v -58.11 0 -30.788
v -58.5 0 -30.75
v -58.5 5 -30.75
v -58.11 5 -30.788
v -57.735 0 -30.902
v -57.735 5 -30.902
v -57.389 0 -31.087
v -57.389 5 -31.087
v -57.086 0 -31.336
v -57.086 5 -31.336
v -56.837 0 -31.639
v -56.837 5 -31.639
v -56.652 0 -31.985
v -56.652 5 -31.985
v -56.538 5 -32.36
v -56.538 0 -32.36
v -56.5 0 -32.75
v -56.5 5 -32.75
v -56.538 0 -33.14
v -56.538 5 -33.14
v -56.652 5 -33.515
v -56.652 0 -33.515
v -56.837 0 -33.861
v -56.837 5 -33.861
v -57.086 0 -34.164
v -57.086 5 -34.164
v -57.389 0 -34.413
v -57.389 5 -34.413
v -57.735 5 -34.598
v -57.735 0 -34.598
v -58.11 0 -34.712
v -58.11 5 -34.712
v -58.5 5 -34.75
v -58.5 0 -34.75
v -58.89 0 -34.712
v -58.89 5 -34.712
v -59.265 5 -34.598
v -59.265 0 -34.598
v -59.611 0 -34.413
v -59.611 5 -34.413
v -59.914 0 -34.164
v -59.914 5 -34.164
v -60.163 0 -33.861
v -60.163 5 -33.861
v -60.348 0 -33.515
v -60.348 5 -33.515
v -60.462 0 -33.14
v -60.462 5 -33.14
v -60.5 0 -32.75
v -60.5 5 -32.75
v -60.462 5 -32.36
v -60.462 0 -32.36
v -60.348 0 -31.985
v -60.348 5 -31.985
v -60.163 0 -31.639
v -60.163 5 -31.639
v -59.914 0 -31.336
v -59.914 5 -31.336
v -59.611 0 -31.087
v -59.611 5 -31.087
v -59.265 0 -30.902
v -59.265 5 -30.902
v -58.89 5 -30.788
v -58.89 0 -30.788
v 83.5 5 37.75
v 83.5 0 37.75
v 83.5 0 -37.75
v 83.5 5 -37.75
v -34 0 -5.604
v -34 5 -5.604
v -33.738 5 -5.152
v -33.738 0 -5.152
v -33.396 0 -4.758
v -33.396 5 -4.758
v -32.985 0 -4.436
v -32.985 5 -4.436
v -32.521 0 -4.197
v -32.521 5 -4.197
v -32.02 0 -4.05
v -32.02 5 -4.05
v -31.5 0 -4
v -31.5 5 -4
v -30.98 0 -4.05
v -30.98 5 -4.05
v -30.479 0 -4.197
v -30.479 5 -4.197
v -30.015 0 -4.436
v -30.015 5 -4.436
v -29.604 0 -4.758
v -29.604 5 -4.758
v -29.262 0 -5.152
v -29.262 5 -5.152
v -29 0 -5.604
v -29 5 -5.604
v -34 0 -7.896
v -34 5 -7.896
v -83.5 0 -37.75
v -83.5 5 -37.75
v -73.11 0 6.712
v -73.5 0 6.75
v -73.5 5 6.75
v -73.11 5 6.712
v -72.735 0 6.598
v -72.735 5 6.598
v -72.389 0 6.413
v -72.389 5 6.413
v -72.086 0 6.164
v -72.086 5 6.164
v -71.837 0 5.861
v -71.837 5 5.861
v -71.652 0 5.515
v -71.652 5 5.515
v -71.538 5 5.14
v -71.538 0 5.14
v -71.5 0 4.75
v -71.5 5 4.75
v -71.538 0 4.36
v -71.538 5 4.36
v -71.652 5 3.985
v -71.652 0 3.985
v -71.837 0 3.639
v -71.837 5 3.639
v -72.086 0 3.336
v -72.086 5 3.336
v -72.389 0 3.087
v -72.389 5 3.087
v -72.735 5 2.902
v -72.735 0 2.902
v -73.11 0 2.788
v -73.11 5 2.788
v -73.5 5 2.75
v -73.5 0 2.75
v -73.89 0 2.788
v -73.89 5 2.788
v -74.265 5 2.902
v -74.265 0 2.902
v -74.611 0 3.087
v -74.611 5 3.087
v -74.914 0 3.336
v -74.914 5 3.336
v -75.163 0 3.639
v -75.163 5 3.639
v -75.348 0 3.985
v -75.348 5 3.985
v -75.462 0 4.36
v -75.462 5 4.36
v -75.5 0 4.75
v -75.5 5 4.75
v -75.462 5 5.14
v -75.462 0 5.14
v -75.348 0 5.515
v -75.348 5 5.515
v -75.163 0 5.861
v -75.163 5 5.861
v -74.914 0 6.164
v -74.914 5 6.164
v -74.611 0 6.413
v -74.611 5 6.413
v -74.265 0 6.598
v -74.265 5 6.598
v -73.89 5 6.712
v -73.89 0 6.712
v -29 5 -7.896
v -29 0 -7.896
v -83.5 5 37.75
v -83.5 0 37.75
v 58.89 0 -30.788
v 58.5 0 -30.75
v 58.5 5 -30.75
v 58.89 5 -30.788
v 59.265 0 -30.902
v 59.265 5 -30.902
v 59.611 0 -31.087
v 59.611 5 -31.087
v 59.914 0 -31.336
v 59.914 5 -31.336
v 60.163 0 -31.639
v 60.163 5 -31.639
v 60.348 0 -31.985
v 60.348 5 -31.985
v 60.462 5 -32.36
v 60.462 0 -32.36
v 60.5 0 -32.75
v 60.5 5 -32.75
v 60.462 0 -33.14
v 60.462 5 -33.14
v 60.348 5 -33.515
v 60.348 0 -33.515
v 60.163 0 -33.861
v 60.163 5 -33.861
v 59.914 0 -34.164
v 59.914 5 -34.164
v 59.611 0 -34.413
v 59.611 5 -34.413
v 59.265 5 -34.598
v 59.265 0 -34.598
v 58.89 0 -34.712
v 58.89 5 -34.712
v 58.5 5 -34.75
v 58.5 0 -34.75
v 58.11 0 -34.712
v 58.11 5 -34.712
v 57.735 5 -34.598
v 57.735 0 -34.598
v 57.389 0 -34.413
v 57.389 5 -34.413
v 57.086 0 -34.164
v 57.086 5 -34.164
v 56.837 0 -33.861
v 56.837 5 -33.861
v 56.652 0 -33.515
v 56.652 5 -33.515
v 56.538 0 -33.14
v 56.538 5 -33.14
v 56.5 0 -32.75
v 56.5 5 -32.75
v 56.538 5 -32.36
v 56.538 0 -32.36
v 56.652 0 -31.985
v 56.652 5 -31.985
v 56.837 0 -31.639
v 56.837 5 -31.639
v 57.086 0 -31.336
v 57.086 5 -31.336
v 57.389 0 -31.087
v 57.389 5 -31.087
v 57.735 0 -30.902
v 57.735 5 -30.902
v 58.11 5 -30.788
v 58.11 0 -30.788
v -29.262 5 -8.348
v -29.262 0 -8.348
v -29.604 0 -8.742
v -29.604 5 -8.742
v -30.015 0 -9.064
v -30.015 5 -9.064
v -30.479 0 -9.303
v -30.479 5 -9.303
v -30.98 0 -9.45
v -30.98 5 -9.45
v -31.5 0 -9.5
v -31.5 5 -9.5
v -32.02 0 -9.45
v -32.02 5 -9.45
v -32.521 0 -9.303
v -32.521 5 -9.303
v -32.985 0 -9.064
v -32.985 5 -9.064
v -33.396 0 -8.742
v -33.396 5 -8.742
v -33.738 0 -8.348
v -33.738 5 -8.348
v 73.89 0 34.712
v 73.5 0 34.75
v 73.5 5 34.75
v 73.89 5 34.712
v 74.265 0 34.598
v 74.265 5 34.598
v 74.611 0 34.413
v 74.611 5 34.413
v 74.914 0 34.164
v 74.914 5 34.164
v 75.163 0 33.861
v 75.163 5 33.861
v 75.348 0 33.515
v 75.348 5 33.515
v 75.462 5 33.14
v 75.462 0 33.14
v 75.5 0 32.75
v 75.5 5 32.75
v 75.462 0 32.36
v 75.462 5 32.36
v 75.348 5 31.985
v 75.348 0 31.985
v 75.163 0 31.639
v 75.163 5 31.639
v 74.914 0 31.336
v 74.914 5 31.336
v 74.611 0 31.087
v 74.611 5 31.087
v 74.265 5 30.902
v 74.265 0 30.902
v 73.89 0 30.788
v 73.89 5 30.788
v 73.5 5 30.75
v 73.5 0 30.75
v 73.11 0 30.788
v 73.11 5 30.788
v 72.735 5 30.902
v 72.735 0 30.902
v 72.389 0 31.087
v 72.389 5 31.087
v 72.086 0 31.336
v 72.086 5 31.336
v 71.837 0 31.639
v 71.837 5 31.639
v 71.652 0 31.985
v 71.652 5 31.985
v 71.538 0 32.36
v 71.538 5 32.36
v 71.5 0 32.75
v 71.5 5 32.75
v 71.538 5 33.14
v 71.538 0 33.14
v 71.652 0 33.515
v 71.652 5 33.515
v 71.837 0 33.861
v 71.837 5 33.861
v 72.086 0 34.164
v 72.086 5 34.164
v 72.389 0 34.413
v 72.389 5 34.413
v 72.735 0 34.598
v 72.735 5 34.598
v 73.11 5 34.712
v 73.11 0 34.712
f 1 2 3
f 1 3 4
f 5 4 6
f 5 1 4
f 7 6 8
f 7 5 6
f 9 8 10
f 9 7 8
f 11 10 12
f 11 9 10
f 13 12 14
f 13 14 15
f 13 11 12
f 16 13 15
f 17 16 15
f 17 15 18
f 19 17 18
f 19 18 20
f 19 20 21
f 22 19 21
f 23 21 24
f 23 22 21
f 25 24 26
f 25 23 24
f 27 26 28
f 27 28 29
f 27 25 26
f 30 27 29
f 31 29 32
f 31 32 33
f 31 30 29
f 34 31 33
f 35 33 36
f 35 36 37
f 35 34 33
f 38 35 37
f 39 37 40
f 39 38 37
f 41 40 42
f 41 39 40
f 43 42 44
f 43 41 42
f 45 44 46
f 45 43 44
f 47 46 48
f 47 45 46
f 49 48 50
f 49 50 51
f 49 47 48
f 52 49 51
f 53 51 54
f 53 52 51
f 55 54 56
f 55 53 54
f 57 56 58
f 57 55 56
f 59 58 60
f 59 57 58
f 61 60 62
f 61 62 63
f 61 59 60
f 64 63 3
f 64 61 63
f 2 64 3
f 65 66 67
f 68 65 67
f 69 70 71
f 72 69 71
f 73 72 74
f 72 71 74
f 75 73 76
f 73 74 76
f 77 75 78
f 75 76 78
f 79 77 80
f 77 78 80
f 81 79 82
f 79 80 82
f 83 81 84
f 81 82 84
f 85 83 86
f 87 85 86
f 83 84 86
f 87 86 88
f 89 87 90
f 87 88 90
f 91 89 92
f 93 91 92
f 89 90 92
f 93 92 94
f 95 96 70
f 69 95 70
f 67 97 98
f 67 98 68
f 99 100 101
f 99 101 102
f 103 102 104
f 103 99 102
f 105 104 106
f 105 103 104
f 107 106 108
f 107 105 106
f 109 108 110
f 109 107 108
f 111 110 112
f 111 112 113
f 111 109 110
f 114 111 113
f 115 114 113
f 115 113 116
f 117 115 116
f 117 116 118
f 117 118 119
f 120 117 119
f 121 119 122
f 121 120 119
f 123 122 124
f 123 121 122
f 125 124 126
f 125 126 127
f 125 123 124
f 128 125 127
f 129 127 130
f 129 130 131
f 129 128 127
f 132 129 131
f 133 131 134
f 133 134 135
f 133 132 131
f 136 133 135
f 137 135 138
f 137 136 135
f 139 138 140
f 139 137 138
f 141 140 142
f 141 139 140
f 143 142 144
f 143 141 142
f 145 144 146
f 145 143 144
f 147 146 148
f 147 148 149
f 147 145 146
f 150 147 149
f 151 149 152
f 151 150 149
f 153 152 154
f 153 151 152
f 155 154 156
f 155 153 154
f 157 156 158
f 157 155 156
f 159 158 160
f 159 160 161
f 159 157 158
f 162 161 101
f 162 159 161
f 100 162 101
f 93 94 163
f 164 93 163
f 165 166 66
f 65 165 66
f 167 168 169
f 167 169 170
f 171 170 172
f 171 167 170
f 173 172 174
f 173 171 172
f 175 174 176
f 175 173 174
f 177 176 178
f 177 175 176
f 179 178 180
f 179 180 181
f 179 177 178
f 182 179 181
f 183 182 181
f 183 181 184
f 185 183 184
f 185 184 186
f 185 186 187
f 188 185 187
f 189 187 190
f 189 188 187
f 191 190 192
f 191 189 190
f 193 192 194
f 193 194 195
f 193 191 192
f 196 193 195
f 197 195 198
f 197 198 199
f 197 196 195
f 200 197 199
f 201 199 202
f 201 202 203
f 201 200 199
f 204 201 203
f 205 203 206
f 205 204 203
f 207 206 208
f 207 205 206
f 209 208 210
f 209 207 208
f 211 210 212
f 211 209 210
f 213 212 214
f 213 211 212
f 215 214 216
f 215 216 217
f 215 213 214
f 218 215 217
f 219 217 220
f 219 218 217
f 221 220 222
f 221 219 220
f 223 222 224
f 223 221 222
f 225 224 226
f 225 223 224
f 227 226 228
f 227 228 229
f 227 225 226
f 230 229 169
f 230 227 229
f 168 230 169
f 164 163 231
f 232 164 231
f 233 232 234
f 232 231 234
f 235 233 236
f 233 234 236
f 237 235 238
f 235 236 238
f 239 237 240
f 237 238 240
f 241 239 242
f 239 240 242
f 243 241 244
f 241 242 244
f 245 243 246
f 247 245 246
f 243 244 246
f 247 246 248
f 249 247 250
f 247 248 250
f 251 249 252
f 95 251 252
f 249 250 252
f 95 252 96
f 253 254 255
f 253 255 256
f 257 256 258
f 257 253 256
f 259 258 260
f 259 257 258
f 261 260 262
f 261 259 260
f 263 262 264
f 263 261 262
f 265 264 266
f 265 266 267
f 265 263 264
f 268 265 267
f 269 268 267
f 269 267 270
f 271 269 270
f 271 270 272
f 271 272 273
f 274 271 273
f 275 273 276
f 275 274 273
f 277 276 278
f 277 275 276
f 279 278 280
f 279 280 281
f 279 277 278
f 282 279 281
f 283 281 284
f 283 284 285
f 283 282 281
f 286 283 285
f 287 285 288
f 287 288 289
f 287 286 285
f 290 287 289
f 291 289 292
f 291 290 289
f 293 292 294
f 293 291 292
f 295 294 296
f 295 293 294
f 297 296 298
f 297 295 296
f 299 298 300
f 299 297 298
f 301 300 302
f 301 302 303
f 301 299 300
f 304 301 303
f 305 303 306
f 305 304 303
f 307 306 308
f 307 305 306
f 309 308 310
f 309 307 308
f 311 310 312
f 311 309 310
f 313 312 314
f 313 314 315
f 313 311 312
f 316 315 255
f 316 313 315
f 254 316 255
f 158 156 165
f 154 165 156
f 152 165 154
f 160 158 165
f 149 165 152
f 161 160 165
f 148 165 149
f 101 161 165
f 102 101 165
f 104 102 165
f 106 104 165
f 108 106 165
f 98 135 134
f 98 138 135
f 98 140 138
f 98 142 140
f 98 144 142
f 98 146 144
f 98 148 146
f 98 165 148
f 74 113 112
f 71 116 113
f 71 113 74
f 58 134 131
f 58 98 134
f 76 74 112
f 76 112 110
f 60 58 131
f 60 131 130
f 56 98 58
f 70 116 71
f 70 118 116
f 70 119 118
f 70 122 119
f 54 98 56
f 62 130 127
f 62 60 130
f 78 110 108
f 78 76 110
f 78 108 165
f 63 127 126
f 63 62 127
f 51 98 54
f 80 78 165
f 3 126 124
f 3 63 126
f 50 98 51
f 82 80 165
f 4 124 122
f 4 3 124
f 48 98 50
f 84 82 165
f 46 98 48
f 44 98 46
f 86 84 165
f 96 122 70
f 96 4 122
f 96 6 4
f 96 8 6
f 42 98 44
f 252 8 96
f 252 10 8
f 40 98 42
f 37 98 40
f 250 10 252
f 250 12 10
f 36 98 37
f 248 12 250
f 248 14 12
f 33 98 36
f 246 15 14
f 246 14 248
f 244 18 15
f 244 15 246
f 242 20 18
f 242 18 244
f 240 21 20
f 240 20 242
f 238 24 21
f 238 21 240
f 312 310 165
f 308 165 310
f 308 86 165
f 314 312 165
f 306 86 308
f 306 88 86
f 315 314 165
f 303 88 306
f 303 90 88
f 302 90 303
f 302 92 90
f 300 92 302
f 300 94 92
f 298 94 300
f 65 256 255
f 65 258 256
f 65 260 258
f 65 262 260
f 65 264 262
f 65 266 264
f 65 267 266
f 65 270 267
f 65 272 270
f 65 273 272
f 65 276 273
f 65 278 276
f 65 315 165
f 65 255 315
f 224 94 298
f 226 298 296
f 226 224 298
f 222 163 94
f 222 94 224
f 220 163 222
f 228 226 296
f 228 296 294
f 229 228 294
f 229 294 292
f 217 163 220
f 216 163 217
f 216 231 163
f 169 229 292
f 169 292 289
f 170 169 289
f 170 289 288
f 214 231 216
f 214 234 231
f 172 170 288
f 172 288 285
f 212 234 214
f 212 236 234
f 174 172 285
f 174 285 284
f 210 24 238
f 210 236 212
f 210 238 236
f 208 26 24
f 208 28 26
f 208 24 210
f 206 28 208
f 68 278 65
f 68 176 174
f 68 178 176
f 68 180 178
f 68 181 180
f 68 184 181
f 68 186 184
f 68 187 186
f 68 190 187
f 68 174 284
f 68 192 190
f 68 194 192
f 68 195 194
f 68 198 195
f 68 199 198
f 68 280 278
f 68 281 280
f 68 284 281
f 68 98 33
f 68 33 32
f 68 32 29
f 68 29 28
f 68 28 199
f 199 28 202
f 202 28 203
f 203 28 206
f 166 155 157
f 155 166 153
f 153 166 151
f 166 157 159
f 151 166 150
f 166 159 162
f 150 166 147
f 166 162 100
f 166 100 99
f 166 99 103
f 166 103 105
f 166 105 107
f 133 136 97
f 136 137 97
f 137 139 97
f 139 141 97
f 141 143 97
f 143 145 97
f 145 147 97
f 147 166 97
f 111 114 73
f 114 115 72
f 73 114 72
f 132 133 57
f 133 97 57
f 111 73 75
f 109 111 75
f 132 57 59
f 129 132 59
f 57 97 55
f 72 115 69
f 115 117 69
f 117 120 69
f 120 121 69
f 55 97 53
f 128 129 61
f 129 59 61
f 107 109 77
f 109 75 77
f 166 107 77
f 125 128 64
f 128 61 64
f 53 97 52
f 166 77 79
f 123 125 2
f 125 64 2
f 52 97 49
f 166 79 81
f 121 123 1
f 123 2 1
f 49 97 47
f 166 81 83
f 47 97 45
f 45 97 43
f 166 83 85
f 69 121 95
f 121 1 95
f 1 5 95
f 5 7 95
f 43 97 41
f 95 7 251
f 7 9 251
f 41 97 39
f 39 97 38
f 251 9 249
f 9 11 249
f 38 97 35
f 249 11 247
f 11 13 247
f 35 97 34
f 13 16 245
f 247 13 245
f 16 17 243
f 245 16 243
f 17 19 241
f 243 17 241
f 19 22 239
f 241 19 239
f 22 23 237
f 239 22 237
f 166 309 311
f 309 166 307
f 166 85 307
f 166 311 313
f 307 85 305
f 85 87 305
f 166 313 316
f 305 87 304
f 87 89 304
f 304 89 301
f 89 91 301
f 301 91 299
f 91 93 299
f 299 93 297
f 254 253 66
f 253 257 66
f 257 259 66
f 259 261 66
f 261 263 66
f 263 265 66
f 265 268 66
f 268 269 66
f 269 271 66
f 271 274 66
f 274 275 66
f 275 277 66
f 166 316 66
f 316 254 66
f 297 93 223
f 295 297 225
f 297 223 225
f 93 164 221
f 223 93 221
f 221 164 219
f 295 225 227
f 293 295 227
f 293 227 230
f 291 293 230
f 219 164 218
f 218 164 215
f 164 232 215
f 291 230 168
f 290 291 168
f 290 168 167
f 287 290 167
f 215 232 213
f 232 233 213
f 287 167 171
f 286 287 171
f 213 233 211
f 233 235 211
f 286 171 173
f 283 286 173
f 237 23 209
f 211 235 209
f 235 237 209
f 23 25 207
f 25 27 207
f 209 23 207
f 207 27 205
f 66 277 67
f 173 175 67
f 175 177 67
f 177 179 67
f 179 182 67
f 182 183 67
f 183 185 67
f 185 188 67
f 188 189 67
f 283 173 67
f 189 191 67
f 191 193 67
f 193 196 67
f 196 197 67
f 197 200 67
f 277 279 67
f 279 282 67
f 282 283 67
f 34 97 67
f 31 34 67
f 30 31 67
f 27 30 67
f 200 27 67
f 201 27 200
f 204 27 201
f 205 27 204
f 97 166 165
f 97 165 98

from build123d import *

# Parameters (mm, degrees)
SKETCH2_W           = 167
SKETCH2_H           = 75.5
SKETCH2_R           = 2
BOSS_EXTRUDE1_DEPTH = 5
CUT_EXTRUDE1_DEPTH  = 92.77315784


with BuildPart() as part:
    # Sketch2 → Boss-Extrude1 (new body)
    with BuildSketch(Plane(origin=(0, 0, 0), x_dir=(1, 0, 0), z_dir=(0, 1, 0))):
        Rectangle(SKETCH2_W, SKETCH2_H)
        with Locations(Location((-58.5, 32.75, 0), (0, 0, 270))):
            Circle(SKETCH2_R, mode=Mode.SUBTRACT)
        with Locations(Location((58.5, 32.75, 0), (0, 0, 270))):
            Circle(SKETCH2_R, mode=Mode.SUBTRACT)
        with Locations(Location((-73.5, -4.75, 0), (0, 0, 270))):
            Circle(SKETCH2_R, mode=Mode.SUBTRACT)
        with Locations(Location((73.5, -32.75, 0), (0, 0, 270))):
            Circle(SKETCH2_R, mode=Mode.SUBTRACT)
    extrude(amount=BOSS_EXTRUDE1_DEPTH)

    # Sketch3 → Cut-Extrude1 (cut, through all)
    with BuildSketch(Plane(origin=(0, 5, 0), x_dir=(1, 0, 0), z_dir=(0, 1, 0))):
        with BuildLine():
            ThreePointArc((-29, 7.895643924), (-31.5, 9.5), (-34, 7.895643924))
            Line((-34, 7.895643924), (-34, 5.604356076))
            ThreePointArc((-34, 5.604356076), (-31.5, 4), (-29, 5.604356076))
            Line((-29, 5.604356076), (-29, 7.895643924))
        make_face()
    extrude(amount=-CUT_EXTRUDE1_DEPTH, mode=Mode.SUBTRACT)


solid = part.part
